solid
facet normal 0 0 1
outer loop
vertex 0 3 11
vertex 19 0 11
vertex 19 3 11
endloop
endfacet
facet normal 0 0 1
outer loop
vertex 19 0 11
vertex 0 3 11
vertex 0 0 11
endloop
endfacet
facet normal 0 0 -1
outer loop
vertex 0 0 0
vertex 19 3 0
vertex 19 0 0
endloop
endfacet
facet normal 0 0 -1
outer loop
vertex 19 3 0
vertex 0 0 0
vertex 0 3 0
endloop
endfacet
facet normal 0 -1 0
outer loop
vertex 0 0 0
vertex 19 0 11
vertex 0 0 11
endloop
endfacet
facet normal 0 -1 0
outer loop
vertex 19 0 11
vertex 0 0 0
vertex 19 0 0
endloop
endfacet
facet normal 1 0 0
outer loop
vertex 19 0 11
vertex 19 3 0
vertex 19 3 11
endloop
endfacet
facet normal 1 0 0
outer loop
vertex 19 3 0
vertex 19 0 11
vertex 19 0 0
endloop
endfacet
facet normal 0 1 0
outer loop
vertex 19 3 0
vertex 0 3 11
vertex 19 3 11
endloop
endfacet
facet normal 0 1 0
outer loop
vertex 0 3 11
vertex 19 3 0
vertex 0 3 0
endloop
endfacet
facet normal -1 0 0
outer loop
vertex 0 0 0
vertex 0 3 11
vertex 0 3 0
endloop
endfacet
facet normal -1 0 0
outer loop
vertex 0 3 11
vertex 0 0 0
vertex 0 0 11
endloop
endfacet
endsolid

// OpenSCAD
// Generated by SolidPython 1.0.1 on 2020-07-29 00:46:56


cube(size = [19, 3, 11]);
/***********************************************
*********      SolidPython code:      **********
************************************************
 
# import packages: SolidPython
from solid import *
from solid.utils import *
from itertools import chain, combinations, permutations


class Resize:

    def __init__(self, scad_file):
        self.scad_file = scad_file
        #self.scad_file = import_scad(scad_file)
        # cone/cylinder param:
        self.r1 = 0
        self.r2 = 0
        self.h = 0
        # rectangular prism param:
        self.w = 0
        self.l = 0
        # ellipse param:
        self.r = 0

    # import OpenScad code (file name corresponds to shape)


    # classify shape + parameters
    def assign(self, param1, param2, param3):
        if self.scad_file == 'cone.scad':
            self.r1 = param1
            self.r2 = param2
            self.h = param3
        elif self.scad_file == 'cylinder.scad':
            self.r1 = param1
            self.r2 = param2
            self.h = param3
        elif self.scad_file == 'rectangularPrism.scad':
            self.h = param1
            self.l = param2
            self.w = param3
        else:
            self.r = param1
            self.h = param2

    # resize parameters
    def iterate(self):
        x = range(3, 20, 2)
        i = 1
        if self.scad_file == 'cone.scad':
            tempList = list(permutations(x, 2))
            for temp in tempList:
                param1 = temp[0]
                param2 = temp[1]
                filepath = 'produced_scad_files/' + 'cone' + str(param1) + '_' + str(param2) + '_' + '.scad'
                scad_render_to_file(cylinder(h=param1, r1=param2, r2=0), filepath)

        elif self.scad_file == 'cylinder.scad':
            tempList = list(permutations(x, 3))
            for temp in tempList:
                param1 = temp[0]
                param2 = temp[1]
                filepath = 'produced_scad_files/' + 'cylinder' + str(param1) + '_' + str(param2) + '_' + '.scad'
                scad_render_to_file(cylinder(h=param1, r1=param2, r2=param2), filepath)

        elif self.scad_file == 'rectangularPrism.scad':
            tempList = list(permutations(x, 3))
            for temp in tempList:
                param1 = temp[0]
                param2 = temp[1]
                param3 = temp[2]
                filepath = 'produced_scad_files/' + 'rectangularPrism' + str(param1) + '_' + str(param2) + '_' + str(
                    param3) + '.scad'
                scad_render_to_file(cube(size=(param1, param2, param3)), filepath)

        elif self.scad_file == 'ellipse.scad':
            tempList = list(permutations(x, 4))
            for temp in tempList:
                param1 = temp[0]
                param2 = temp[1]
                param3 = temp[2]
                param4 = temp[3]
                filepath = 'produced_scad_files/' + 'ellipse' + str(param1) + '_' + str(param2) + '_' + str(param3) + '_' + str(param4) + '.scad'
                scad_render_to_file(scale([param1, param2, param3])(sphere(r=param4)), filepath)

    def render_to_scadfile(self):
        scad_render_to_file(scad, 'example.scad') 
 
************************************************/
